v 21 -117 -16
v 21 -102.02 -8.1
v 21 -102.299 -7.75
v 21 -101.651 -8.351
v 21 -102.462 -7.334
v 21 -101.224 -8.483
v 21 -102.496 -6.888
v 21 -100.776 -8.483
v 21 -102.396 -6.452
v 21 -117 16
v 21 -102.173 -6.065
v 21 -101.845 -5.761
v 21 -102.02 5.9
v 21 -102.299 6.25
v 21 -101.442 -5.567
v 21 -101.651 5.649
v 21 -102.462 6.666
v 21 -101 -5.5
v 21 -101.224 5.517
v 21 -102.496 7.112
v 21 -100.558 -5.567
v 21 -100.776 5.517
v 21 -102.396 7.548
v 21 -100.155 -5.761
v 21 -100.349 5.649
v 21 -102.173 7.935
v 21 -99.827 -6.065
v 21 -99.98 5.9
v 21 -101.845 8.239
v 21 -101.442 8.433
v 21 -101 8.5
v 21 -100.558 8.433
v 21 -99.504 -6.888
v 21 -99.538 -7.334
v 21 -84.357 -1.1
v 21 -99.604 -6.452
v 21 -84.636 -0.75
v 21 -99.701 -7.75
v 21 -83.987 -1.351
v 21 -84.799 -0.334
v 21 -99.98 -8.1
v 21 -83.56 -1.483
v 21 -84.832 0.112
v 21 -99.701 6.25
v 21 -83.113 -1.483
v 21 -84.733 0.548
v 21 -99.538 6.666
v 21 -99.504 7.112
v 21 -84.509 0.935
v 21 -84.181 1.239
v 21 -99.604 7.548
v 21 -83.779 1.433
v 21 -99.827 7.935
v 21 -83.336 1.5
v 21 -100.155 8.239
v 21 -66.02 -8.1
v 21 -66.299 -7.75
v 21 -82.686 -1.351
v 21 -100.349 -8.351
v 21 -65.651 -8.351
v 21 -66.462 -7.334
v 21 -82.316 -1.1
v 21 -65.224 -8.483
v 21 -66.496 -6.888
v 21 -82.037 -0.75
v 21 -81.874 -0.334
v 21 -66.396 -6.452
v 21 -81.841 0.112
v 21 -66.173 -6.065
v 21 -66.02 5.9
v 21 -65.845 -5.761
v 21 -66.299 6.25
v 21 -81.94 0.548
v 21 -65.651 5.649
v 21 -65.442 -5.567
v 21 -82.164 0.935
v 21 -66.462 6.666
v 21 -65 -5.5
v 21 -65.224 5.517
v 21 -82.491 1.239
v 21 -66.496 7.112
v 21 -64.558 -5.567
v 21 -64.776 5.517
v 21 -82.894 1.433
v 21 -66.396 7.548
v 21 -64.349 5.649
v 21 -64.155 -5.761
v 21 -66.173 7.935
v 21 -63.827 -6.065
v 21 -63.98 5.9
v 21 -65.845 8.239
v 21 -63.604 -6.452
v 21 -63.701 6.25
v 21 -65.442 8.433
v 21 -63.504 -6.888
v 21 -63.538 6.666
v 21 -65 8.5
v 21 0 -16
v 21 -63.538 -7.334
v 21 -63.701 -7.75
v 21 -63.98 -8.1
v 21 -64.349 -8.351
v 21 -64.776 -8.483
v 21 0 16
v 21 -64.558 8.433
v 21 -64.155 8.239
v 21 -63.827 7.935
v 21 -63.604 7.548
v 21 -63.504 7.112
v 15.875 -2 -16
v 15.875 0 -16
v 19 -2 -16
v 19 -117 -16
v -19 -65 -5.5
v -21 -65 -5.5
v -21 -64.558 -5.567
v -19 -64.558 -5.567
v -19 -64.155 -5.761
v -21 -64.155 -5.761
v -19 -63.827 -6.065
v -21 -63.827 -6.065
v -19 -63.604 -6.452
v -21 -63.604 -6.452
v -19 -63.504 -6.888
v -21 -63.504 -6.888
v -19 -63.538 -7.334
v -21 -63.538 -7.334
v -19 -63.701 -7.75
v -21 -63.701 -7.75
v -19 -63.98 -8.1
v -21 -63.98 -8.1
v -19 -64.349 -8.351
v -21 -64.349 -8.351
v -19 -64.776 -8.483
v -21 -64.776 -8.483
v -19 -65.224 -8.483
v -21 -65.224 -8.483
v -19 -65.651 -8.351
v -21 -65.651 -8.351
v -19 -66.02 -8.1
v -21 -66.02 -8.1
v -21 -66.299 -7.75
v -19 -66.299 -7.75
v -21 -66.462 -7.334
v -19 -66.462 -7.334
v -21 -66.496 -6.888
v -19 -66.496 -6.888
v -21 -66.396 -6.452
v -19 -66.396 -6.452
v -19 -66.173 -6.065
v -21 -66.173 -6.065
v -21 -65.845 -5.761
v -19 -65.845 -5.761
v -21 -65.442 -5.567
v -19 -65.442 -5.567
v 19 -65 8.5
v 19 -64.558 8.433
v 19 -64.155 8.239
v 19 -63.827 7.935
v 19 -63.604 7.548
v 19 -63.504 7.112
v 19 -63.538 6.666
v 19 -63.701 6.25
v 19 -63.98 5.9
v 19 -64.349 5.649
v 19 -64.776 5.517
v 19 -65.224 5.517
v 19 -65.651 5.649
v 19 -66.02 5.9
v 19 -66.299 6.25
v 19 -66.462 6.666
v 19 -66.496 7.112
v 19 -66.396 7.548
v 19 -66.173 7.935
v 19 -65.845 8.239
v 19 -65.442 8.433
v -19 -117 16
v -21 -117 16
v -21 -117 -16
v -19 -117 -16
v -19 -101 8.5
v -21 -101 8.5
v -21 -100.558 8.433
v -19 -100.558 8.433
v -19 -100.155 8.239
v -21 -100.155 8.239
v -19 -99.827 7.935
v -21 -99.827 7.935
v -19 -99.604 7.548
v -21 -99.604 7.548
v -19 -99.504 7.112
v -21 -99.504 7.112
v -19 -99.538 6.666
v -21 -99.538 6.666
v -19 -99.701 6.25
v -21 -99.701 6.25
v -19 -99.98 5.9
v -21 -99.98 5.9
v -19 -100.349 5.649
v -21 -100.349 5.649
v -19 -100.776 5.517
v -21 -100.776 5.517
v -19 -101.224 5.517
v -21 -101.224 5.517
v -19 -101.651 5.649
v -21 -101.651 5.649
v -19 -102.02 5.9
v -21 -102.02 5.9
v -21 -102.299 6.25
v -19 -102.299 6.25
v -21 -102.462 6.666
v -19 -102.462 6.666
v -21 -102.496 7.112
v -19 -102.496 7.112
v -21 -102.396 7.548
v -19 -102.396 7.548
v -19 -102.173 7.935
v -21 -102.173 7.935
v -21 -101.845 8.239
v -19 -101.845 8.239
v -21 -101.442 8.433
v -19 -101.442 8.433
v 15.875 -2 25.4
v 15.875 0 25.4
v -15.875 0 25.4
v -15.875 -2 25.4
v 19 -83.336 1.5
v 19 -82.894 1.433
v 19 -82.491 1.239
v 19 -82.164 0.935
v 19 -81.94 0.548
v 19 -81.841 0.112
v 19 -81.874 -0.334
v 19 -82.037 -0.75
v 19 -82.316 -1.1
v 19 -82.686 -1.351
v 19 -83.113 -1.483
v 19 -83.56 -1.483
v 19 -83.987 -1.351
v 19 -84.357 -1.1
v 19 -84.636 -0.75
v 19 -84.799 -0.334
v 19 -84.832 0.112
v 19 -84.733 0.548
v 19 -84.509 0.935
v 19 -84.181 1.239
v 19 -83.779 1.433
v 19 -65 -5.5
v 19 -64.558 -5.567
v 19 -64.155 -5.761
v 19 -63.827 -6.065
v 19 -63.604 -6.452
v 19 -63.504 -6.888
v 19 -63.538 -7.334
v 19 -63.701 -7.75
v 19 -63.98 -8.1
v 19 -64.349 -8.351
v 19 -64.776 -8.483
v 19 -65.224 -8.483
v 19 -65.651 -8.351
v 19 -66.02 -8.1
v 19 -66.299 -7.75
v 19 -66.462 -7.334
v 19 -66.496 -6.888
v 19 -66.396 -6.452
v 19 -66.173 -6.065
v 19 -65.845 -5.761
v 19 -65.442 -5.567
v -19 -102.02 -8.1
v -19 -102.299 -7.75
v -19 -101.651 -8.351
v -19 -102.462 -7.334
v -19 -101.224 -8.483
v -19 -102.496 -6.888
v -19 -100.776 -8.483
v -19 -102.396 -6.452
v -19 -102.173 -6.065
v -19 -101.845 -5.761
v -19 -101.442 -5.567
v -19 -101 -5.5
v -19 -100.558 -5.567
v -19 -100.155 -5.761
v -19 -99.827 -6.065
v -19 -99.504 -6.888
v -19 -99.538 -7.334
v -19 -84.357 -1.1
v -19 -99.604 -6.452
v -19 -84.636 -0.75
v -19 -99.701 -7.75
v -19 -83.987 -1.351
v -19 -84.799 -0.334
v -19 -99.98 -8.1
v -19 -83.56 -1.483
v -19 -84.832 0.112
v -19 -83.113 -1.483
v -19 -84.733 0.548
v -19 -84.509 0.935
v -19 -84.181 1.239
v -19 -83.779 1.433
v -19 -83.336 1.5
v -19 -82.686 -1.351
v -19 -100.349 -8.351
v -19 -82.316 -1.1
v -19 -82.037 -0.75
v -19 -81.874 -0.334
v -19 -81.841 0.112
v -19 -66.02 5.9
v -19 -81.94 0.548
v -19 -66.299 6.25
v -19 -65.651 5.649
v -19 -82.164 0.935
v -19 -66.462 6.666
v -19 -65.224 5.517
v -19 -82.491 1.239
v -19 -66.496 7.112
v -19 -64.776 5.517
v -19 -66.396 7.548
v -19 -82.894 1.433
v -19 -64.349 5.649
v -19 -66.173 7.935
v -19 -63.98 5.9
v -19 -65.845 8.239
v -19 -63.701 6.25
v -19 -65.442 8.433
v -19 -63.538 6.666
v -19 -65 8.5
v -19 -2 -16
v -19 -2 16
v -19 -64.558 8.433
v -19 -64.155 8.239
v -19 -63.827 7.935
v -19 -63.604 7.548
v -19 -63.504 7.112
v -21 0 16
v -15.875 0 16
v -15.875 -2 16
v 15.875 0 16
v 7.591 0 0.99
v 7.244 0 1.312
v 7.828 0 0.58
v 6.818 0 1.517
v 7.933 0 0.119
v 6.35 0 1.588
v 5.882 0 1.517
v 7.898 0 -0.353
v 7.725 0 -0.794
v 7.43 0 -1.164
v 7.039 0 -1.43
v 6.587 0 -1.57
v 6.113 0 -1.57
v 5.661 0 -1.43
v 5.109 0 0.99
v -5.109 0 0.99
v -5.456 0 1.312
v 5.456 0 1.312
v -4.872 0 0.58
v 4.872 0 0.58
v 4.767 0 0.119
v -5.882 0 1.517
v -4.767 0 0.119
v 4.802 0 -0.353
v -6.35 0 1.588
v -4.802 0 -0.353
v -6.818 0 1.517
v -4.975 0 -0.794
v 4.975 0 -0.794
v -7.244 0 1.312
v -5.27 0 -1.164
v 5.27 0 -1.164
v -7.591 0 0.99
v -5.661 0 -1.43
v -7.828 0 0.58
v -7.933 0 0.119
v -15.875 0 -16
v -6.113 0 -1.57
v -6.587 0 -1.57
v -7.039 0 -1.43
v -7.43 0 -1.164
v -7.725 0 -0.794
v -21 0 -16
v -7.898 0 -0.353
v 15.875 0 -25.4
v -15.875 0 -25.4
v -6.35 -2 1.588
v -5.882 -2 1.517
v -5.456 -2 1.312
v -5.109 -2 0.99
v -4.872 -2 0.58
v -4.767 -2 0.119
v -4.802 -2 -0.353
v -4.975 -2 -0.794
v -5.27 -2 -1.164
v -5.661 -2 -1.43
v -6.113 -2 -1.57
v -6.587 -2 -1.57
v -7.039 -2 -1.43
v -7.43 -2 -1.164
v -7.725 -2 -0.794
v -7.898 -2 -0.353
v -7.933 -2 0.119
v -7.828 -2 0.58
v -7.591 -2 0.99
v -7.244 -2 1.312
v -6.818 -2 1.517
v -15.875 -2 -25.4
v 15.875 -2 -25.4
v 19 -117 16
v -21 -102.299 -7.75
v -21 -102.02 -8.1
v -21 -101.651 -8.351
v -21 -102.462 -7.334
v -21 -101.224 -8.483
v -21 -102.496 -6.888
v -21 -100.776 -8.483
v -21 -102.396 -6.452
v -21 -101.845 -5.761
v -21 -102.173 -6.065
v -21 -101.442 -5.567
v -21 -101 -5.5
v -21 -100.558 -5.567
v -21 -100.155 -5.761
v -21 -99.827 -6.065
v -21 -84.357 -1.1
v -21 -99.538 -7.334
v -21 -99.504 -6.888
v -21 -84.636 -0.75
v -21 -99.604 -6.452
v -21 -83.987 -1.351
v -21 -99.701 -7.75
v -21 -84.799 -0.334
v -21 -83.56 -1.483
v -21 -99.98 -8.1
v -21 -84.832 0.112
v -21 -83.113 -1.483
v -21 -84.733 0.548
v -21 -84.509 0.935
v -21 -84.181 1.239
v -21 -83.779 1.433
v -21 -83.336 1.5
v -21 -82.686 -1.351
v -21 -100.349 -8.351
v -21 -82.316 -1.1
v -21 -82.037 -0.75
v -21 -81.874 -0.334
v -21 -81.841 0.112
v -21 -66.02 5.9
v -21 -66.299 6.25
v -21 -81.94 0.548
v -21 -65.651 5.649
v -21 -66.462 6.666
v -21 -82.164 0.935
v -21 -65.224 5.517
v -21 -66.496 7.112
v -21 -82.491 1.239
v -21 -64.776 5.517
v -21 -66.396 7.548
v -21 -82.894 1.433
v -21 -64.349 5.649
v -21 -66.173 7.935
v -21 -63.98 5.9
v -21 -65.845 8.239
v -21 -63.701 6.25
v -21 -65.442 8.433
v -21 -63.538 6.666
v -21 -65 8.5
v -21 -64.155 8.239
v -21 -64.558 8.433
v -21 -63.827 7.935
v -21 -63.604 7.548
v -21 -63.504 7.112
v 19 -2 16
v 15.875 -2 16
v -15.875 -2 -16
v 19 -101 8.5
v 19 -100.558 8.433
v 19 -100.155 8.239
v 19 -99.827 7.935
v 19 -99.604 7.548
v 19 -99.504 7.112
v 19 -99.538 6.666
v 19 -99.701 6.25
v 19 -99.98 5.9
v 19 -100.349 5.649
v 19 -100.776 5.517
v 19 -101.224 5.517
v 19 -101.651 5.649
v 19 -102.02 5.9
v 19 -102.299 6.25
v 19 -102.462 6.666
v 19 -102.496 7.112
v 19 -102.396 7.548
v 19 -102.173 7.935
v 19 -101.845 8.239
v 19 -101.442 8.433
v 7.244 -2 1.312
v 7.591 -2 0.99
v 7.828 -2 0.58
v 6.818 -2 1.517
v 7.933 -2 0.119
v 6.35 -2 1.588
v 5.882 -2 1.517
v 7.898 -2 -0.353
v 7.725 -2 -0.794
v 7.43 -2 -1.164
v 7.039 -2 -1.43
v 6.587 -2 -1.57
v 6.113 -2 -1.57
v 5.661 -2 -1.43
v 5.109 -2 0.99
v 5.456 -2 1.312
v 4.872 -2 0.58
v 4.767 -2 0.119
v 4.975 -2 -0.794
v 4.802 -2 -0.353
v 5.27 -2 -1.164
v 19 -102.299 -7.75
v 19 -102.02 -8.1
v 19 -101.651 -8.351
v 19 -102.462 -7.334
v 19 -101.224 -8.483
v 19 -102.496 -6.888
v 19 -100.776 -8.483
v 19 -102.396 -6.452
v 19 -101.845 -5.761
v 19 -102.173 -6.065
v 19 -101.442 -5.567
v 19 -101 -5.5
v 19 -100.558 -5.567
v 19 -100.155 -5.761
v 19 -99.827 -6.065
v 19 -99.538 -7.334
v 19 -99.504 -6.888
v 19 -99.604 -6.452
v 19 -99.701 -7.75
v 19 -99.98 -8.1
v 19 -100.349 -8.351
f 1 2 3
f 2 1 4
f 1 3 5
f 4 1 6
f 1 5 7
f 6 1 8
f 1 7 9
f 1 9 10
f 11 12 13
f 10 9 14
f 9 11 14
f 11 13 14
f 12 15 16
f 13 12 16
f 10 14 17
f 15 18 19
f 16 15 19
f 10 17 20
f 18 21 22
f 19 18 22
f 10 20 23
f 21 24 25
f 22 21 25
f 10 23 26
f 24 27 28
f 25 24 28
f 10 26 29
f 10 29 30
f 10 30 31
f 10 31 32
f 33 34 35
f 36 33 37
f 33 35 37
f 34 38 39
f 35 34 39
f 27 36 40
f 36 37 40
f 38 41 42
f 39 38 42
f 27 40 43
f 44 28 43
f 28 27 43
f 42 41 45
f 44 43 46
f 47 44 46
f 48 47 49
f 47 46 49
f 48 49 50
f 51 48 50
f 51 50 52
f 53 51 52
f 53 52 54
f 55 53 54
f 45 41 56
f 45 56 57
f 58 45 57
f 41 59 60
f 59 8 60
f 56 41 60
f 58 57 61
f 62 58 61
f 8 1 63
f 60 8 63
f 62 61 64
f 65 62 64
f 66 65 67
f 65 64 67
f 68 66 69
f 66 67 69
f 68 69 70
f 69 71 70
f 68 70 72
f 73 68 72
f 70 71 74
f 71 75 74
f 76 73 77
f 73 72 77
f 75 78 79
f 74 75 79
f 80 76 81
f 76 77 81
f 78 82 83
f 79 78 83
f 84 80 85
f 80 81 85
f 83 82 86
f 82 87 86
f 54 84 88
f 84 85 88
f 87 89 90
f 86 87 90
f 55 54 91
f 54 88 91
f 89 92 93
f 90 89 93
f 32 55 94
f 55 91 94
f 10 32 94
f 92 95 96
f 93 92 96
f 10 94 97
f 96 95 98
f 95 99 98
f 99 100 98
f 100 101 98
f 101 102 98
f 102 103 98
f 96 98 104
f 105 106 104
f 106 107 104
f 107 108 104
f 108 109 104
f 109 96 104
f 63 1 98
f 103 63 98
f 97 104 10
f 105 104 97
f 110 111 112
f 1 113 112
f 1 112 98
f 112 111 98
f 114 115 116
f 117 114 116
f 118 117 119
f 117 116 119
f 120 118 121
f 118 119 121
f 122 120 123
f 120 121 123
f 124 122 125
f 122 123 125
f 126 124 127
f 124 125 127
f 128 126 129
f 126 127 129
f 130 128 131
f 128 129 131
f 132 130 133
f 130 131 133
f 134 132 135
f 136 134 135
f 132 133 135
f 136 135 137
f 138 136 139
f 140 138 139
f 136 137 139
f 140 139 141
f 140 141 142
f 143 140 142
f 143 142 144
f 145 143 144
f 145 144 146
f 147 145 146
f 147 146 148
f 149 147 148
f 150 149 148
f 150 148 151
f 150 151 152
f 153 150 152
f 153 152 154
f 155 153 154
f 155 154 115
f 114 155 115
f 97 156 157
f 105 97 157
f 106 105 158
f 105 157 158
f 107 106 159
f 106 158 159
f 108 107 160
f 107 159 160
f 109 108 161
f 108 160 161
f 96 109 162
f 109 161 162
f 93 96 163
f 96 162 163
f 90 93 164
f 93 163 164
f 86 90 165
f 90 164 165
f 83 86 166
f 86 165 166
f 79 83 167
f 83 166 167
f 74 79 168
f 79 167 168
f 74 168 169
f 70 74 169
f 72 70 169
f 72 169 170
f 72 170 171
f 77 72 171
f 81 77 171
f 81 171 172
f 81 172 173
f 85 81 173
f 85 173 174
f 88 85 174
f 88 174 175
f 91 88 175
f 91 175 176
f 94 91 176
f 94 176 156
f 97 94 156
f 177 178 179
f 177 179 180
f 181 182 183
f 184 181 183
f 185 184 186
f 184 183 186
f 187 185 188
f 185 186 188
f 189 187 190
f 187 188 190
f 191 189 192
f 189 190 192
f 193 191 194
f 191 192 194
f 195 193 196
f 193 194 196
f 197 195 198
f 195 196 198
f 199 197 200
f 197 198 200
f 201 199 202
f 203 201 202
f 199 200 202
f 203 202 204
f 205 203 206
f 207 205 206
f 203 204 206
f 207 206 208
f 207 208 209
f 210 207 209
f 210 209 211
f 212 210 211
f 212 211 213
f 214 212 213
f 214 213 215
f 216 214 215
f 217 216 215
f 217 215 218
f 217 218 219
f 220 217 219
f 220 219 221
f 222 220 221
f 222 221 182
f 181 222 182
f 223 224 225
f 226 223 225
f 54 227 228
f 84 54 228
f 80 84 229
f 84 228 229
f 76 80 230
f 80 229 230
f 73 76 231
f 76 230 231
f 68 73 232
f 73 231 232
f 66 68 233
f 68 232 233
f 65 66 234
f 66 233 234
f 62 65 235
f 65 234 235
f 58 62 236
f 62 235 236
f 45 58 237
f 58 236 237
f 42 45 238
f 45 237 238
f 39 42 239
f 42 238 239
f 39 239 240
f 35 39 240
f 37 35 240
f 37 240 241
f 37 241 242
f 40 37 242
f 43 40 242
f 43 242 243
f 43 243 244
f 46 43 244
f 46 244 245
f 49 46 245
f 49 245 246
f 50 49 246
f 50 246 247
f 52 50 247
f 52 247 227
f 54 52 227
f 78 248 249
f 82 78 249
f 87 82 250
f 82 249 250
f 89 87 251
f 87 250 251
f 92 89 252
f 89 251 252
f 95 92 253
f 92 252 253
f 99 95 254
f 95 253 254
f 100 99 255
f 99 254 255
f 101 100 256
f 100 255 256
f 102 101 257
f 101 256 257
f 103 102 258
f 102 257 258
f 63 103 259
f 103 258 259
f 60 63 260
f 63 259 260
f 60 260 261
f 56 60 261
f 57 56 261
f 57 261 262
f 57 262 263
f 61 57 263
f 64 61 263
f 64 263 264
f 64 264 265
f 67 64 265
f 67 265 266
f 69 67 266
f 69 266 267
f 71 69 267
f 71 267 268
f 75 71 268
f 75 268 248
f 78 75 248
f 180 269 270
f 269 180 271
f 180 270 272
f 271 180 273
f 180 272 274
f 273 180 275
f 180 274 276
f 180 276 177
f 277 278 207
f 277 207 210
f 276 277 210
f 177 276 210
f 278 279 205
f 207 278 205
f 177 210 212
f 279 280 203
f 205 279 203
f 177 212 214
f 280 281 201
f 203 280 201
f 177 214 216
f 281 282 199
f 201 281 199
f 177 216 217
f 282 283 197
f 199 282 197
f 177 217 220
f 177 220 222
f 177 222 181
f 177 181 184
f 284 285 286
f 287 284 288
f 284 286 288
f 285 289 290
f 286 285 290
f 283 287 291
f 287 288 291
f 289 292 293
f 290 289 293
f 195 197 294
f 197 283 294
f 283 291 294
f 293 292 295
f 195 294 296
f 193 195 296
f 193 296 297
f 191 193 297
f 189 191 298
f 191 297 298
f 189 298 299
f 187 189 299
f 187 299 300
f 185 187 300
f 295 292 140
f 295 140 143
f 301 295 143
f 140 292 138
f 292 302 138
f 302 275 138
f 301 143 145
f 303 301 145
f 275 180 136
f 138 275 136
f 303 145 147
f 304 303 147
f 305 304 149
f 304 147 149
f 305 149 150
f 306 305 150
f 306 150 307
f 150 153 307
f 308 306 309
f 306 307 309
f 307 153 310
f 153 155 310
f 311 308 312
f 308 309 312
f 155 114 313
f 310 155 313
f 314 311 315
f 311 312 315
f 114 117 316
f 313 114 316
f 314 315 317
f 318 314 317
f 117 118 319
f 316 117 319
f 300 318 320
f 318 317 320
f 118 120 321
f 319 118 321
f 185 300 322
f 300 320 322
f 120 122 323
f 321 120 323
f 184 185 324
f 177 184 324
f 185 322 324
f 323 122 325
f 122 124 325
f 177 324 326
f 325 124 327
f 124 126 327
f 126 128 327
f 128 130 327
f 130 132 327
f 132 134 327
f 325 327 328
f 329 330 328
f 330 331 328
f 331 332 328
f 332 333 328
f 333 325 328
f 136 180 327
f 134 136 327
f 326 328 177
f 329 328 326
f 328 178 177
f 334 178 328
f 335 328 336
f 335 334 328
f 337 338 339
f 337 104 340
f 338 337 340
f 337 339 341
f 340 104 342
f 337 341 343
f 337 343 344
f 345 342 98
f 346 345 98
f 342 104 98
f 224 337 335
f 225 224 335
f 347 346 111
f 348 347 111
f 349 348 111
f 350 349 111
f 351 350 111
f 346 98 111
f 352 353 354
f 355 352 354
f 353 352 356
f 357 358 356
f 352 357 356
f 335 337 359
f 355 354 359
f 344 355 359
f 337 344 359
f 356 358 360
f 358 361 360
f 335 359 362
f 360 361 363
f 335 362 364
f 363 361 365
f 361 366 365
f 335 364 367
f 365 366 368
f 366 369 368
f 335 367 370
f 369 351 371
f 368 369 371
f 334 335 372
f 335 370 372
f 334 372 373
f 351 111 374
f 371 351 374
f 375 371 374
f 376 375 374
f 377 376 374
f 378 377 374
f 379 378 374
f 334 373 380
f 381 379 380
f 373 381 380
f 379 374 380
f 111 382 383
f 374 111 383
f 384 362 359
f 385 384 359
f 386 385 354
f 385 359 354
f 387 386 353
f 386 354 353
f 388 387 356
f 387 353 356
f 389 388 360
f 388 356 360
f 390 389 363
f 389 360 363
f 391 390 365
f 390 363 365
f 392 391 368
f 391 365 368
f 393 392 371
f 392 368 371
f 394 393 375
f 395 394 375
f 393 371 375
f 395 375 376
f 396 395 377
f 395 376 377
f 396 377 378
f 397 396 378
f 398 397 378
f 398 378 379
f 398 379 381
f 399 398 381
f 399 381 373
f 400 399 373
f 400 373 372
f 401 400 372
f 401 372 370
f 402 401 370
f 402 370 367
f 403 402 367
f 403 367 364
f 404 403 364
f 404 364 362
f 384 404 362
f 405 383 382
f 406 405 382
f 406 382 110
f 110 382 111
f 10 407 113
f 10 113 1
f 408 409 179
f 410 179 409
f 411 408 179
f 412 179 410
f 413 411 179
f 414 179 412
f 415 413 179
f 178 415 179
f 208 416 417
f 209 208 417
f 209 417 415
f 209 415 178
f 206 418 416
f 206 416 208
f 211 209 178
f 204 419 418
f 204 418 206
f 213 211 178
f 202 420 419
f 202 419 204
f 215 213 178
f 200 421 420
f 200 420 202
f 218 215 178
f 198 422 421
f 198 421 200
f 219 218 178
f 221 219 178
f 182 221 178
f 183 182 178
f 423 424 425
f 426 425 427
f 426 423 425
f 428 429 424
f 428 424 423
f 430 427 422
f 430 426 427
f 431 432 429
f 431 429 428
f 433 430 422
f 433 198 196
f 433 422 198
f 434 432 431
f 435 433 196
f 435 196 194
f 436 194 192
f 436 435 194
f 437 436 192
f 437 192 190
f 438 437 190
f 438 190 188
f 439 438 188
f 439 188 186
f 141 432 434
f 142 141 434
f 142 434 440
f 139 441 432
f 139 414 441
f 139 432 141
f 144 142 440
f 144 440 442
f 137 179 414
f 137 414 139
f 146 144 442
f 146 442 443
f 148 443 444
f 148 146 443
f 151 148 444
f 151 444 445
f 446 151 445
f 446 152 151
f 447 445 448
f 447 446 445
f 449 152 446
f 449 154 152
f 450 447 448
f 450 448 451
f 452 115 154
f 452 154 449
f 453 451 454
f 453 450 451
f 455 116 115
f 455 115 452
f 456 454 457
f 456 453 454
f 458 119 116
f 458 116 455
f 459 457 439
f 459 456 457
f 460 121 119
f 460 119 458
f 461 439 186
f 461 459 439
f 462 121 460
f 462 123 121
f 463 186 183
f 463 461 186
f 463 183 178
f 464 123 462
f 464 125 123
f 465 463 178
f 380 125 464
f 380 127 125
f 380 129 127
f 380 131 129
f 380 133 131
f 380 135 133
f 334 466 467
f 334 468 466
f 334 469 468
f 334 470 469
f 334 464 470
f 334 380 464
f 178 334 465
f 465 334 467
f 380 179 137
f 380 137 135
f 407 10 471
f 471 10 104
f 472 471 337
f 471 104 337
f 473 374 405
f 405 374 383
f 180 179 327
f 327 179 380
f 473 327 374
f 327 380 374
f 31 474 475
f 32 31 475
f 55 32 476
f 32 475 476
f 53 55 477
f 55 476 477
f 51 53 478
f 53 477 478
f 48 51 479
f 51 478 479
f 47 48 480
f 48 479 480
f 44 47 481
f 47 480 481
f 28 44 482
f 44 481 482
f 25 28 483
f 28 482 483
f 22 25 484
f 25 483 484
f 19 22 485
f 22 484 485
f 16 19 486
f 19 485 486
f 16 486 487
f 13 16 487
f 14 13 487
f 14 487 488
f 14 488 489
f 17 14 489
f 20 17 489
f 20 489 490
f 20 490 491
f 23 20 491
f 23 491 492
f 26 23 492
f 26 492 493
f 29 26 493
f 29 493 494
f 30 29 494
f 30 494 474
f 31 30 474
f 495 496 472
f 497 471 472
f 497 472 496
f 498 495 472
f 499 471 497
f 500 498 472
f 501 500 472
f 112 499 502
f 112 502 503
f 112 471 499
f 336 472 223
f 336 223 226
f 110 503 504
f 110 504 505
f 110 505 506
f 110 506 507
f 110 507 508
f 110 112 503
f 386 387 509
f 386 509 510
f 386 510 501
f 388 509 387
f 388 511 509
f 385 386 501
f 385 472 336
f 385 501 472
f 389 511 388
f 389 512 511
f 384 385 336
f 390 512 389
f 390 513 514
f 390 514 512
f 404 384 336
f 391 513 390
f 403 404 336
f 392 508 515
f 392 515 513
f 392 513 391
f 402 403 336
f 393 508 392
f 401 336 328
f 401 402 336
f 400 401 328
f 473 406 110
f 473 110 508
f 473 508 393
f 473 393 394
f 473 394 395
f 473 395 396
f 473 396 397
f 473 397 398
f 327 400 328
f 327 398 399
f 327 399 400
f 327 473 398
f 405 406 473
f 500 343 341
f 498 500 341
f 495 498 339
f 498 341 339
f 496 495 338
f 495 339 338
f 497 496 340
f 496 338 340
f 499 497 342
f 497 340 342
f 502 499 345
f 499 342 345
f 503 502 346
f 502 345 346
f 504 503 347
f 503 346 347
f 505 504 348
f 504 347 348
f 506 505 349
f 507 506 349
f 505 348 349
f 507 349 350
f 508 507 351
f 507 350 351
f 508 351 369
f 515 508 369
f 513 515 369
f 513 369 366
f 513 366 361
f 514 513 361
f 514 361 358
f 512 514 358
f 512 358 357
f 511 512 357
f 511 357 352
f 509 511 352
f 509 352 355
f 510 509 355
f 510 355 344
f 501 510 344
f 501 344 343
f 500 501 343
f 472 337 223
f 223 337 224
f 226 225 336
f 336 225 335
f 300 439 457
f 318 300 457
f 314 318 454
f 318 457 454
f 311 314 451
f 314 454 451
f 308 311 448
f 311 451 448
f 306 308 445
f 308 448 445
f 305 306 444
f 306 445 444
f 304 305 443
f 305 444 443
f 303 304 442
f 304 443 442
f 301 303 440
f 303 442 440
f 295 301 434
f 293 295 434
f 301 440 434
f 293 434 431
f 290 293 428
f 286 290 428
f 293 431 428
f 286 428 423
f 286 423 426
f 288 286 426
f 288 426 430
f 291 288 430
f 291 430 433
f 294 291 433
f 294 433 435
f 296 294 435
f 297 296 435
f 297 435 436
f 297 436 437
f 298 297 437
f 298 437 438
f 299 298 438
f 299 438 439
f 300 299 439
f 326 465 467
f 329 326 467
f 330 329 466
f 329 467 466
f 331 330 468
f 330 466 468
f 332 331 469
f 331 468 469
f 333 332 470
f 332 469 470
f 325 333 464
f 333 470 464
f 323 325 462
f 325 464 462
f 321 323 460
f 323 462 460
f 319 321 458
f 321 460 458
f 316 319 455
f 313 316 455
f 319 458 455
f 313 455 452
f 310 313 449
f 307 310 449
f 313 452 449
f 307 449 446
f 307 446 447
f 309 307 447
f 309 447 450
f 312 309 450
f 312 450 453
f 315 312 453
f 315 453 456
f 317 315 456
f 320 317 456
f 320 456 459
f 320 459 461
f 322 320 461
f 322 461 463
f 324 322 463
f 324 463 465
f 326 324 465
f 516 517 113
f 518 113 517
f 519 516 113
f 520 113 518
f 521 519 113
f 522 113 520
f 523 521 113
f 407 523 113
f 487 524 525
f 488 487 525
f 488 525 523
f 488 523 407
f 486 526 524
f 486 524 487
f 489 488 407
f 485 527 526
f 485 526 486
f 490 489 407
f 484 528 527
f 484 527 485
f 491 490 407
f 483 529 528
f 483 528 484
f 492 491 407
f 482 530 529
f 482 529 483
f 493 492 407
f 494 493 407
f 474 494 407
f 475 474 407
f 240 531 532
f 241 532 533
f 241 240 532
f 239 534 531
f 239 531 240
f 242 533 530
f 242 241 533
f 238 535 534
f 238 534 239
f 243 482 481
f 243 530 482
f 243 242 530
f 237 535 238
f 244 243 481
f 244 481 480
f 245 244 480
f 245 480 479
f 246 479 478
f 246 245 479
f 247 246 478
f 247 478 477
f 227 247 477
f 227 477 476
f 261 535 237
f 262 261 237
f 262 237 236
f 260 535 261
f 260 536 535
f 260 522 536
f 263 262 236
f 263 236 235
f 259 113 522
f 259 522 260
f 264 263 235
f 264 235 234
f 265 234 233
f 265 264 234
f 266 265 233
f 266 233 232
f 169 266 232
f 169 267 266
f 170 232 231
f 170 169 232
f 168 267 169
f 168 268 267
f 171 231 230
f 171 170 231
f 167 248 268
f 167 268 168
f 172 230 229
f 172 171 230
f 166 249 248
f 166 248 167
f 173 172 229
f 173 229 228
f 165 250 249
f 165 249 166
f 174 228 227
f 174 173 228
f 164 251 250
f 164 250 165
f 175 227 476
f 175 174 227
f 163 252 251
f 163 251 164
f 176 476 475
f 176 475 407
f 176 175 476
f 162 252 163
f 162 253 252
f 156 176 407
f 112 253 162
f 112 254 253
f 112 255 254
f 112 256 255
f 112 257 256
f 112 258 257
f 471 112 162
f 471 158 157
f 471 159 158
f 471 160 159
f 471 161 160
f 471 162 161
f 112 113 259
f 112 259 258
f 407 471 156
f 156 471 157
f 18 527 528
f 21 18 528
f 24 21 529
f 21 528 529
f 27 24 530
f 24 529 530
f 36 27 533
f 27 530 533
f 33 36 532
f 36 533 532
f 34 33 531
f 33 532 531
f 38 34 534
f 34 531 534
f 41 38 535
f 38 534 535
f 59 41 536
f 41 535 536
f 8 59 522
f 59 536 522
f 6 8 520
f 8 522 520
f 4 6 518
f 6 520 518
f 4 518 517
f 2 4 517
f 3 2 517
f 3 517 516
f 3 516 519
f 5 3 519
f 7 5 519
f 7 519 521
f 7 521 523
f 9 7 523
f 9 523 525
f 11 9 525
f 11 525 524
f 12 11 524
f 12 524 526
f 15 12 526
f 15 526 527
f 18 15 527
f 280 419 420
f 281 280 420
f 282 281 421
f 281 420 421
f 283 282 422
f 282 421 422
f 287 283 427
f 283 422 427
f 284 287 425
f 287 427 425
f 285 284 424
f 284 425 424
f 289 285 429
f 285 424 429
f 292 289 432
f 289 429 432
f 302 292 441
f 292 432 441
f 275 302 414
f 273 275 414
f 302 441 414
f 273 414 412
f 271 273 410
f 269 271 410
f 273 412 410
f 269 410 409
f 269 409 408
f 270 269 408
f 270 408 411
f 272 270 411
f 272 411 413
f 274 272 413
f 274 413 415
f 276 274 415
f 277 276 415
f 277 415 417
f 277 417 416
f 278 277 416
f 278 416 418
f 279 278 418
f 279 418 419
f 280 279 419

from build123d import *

# Parameters (mm, degrees)
BOSS_EXTRUDE1_DEPTH = 2
SKETCH2_W           = 2
SKETCH2_H           = 32
BOSS_EXTRUDE2_DEPTH = 115
SKETCH3_R           = 1.5
CUT_EXTRUDE1_DEPTH  = 127.878524582
SKETCH4_R           = 1.5875
CUT_EXTRUDE2_DEPTH  = 122.553115962


with BuildPart() as part:
    # Sketch1 → Boss-Extrude1 (new body)
    with BuildSketch(Plane(origin=(0, 0, 0), x_dir=(1, 0, 0), z_dir=(0, 1, 0))):
        Polygon((-21, 16), (-15.875, 16), (-15.875, 25.4), (15.875, 25.4), (15.875, 16), (21, 16), (21, -16), (15.875, -16), (15.875, -25.4), (-15.875, -25.4), (-15.875, -16), (-21, -16), align=None)
    extrude(amount=-BOSS_EXTRUDE1_DEPTH)

    # Sketch2 → Boss-Extrude2 (add)
    with BuildSketch(Plane.XZ.offset(2)):
        with Locations((-20, 0)):
            Rectangle(SKETCH2_W, SKETCH2_H)
        with Locations((20, 0)):
            Rectangle(SKETCH2_W, SKETCH2_H)
    extrude(amount=BOSS_EXTRUDE2_DEPTH)

    # Sketch3 → Cut-Extrude1 (cut, through all)
    with BuildSketch(Plane.ZY.offset(21)):
        with Locations((-7, -65)):
            Circle(SKETCH3_R)
        with Locations((7, -65)):
            Circle(SKETCH3_R)
        with Locations((7, -101)):
            Circle(SKETCH3_R)
        with Locations((-7, -101)):
            Circle(SKETCH3_R)
        with Locations((0, -83.336478267)):
            Circle(SKETCH3_R)
    extrude(amount=-CUT_EXTRUDE1_DEPTH, mode=Mode.SUBTRACT)

    # Sketch4 → Cut-Extrude2 (cut, through all)
    with BuildSketch(Plane(origin=(0, 0, 0), x_dir=(1, 0, 0), z_dir=(0, 1, 0))):
        with Locations(Location((-6.35, 0, 0), (0, 0, 270))):
            Circle(SKETCH4_R)
        with Locations(Location((6.35, 0, 0), (0, 0, 270))):
            Circle(SKETCH4_R)
    extrude(amount=-CUT_EXTRUDE2_DEPTH, mode=Mode.SUBTRACT)


solid = part.part
